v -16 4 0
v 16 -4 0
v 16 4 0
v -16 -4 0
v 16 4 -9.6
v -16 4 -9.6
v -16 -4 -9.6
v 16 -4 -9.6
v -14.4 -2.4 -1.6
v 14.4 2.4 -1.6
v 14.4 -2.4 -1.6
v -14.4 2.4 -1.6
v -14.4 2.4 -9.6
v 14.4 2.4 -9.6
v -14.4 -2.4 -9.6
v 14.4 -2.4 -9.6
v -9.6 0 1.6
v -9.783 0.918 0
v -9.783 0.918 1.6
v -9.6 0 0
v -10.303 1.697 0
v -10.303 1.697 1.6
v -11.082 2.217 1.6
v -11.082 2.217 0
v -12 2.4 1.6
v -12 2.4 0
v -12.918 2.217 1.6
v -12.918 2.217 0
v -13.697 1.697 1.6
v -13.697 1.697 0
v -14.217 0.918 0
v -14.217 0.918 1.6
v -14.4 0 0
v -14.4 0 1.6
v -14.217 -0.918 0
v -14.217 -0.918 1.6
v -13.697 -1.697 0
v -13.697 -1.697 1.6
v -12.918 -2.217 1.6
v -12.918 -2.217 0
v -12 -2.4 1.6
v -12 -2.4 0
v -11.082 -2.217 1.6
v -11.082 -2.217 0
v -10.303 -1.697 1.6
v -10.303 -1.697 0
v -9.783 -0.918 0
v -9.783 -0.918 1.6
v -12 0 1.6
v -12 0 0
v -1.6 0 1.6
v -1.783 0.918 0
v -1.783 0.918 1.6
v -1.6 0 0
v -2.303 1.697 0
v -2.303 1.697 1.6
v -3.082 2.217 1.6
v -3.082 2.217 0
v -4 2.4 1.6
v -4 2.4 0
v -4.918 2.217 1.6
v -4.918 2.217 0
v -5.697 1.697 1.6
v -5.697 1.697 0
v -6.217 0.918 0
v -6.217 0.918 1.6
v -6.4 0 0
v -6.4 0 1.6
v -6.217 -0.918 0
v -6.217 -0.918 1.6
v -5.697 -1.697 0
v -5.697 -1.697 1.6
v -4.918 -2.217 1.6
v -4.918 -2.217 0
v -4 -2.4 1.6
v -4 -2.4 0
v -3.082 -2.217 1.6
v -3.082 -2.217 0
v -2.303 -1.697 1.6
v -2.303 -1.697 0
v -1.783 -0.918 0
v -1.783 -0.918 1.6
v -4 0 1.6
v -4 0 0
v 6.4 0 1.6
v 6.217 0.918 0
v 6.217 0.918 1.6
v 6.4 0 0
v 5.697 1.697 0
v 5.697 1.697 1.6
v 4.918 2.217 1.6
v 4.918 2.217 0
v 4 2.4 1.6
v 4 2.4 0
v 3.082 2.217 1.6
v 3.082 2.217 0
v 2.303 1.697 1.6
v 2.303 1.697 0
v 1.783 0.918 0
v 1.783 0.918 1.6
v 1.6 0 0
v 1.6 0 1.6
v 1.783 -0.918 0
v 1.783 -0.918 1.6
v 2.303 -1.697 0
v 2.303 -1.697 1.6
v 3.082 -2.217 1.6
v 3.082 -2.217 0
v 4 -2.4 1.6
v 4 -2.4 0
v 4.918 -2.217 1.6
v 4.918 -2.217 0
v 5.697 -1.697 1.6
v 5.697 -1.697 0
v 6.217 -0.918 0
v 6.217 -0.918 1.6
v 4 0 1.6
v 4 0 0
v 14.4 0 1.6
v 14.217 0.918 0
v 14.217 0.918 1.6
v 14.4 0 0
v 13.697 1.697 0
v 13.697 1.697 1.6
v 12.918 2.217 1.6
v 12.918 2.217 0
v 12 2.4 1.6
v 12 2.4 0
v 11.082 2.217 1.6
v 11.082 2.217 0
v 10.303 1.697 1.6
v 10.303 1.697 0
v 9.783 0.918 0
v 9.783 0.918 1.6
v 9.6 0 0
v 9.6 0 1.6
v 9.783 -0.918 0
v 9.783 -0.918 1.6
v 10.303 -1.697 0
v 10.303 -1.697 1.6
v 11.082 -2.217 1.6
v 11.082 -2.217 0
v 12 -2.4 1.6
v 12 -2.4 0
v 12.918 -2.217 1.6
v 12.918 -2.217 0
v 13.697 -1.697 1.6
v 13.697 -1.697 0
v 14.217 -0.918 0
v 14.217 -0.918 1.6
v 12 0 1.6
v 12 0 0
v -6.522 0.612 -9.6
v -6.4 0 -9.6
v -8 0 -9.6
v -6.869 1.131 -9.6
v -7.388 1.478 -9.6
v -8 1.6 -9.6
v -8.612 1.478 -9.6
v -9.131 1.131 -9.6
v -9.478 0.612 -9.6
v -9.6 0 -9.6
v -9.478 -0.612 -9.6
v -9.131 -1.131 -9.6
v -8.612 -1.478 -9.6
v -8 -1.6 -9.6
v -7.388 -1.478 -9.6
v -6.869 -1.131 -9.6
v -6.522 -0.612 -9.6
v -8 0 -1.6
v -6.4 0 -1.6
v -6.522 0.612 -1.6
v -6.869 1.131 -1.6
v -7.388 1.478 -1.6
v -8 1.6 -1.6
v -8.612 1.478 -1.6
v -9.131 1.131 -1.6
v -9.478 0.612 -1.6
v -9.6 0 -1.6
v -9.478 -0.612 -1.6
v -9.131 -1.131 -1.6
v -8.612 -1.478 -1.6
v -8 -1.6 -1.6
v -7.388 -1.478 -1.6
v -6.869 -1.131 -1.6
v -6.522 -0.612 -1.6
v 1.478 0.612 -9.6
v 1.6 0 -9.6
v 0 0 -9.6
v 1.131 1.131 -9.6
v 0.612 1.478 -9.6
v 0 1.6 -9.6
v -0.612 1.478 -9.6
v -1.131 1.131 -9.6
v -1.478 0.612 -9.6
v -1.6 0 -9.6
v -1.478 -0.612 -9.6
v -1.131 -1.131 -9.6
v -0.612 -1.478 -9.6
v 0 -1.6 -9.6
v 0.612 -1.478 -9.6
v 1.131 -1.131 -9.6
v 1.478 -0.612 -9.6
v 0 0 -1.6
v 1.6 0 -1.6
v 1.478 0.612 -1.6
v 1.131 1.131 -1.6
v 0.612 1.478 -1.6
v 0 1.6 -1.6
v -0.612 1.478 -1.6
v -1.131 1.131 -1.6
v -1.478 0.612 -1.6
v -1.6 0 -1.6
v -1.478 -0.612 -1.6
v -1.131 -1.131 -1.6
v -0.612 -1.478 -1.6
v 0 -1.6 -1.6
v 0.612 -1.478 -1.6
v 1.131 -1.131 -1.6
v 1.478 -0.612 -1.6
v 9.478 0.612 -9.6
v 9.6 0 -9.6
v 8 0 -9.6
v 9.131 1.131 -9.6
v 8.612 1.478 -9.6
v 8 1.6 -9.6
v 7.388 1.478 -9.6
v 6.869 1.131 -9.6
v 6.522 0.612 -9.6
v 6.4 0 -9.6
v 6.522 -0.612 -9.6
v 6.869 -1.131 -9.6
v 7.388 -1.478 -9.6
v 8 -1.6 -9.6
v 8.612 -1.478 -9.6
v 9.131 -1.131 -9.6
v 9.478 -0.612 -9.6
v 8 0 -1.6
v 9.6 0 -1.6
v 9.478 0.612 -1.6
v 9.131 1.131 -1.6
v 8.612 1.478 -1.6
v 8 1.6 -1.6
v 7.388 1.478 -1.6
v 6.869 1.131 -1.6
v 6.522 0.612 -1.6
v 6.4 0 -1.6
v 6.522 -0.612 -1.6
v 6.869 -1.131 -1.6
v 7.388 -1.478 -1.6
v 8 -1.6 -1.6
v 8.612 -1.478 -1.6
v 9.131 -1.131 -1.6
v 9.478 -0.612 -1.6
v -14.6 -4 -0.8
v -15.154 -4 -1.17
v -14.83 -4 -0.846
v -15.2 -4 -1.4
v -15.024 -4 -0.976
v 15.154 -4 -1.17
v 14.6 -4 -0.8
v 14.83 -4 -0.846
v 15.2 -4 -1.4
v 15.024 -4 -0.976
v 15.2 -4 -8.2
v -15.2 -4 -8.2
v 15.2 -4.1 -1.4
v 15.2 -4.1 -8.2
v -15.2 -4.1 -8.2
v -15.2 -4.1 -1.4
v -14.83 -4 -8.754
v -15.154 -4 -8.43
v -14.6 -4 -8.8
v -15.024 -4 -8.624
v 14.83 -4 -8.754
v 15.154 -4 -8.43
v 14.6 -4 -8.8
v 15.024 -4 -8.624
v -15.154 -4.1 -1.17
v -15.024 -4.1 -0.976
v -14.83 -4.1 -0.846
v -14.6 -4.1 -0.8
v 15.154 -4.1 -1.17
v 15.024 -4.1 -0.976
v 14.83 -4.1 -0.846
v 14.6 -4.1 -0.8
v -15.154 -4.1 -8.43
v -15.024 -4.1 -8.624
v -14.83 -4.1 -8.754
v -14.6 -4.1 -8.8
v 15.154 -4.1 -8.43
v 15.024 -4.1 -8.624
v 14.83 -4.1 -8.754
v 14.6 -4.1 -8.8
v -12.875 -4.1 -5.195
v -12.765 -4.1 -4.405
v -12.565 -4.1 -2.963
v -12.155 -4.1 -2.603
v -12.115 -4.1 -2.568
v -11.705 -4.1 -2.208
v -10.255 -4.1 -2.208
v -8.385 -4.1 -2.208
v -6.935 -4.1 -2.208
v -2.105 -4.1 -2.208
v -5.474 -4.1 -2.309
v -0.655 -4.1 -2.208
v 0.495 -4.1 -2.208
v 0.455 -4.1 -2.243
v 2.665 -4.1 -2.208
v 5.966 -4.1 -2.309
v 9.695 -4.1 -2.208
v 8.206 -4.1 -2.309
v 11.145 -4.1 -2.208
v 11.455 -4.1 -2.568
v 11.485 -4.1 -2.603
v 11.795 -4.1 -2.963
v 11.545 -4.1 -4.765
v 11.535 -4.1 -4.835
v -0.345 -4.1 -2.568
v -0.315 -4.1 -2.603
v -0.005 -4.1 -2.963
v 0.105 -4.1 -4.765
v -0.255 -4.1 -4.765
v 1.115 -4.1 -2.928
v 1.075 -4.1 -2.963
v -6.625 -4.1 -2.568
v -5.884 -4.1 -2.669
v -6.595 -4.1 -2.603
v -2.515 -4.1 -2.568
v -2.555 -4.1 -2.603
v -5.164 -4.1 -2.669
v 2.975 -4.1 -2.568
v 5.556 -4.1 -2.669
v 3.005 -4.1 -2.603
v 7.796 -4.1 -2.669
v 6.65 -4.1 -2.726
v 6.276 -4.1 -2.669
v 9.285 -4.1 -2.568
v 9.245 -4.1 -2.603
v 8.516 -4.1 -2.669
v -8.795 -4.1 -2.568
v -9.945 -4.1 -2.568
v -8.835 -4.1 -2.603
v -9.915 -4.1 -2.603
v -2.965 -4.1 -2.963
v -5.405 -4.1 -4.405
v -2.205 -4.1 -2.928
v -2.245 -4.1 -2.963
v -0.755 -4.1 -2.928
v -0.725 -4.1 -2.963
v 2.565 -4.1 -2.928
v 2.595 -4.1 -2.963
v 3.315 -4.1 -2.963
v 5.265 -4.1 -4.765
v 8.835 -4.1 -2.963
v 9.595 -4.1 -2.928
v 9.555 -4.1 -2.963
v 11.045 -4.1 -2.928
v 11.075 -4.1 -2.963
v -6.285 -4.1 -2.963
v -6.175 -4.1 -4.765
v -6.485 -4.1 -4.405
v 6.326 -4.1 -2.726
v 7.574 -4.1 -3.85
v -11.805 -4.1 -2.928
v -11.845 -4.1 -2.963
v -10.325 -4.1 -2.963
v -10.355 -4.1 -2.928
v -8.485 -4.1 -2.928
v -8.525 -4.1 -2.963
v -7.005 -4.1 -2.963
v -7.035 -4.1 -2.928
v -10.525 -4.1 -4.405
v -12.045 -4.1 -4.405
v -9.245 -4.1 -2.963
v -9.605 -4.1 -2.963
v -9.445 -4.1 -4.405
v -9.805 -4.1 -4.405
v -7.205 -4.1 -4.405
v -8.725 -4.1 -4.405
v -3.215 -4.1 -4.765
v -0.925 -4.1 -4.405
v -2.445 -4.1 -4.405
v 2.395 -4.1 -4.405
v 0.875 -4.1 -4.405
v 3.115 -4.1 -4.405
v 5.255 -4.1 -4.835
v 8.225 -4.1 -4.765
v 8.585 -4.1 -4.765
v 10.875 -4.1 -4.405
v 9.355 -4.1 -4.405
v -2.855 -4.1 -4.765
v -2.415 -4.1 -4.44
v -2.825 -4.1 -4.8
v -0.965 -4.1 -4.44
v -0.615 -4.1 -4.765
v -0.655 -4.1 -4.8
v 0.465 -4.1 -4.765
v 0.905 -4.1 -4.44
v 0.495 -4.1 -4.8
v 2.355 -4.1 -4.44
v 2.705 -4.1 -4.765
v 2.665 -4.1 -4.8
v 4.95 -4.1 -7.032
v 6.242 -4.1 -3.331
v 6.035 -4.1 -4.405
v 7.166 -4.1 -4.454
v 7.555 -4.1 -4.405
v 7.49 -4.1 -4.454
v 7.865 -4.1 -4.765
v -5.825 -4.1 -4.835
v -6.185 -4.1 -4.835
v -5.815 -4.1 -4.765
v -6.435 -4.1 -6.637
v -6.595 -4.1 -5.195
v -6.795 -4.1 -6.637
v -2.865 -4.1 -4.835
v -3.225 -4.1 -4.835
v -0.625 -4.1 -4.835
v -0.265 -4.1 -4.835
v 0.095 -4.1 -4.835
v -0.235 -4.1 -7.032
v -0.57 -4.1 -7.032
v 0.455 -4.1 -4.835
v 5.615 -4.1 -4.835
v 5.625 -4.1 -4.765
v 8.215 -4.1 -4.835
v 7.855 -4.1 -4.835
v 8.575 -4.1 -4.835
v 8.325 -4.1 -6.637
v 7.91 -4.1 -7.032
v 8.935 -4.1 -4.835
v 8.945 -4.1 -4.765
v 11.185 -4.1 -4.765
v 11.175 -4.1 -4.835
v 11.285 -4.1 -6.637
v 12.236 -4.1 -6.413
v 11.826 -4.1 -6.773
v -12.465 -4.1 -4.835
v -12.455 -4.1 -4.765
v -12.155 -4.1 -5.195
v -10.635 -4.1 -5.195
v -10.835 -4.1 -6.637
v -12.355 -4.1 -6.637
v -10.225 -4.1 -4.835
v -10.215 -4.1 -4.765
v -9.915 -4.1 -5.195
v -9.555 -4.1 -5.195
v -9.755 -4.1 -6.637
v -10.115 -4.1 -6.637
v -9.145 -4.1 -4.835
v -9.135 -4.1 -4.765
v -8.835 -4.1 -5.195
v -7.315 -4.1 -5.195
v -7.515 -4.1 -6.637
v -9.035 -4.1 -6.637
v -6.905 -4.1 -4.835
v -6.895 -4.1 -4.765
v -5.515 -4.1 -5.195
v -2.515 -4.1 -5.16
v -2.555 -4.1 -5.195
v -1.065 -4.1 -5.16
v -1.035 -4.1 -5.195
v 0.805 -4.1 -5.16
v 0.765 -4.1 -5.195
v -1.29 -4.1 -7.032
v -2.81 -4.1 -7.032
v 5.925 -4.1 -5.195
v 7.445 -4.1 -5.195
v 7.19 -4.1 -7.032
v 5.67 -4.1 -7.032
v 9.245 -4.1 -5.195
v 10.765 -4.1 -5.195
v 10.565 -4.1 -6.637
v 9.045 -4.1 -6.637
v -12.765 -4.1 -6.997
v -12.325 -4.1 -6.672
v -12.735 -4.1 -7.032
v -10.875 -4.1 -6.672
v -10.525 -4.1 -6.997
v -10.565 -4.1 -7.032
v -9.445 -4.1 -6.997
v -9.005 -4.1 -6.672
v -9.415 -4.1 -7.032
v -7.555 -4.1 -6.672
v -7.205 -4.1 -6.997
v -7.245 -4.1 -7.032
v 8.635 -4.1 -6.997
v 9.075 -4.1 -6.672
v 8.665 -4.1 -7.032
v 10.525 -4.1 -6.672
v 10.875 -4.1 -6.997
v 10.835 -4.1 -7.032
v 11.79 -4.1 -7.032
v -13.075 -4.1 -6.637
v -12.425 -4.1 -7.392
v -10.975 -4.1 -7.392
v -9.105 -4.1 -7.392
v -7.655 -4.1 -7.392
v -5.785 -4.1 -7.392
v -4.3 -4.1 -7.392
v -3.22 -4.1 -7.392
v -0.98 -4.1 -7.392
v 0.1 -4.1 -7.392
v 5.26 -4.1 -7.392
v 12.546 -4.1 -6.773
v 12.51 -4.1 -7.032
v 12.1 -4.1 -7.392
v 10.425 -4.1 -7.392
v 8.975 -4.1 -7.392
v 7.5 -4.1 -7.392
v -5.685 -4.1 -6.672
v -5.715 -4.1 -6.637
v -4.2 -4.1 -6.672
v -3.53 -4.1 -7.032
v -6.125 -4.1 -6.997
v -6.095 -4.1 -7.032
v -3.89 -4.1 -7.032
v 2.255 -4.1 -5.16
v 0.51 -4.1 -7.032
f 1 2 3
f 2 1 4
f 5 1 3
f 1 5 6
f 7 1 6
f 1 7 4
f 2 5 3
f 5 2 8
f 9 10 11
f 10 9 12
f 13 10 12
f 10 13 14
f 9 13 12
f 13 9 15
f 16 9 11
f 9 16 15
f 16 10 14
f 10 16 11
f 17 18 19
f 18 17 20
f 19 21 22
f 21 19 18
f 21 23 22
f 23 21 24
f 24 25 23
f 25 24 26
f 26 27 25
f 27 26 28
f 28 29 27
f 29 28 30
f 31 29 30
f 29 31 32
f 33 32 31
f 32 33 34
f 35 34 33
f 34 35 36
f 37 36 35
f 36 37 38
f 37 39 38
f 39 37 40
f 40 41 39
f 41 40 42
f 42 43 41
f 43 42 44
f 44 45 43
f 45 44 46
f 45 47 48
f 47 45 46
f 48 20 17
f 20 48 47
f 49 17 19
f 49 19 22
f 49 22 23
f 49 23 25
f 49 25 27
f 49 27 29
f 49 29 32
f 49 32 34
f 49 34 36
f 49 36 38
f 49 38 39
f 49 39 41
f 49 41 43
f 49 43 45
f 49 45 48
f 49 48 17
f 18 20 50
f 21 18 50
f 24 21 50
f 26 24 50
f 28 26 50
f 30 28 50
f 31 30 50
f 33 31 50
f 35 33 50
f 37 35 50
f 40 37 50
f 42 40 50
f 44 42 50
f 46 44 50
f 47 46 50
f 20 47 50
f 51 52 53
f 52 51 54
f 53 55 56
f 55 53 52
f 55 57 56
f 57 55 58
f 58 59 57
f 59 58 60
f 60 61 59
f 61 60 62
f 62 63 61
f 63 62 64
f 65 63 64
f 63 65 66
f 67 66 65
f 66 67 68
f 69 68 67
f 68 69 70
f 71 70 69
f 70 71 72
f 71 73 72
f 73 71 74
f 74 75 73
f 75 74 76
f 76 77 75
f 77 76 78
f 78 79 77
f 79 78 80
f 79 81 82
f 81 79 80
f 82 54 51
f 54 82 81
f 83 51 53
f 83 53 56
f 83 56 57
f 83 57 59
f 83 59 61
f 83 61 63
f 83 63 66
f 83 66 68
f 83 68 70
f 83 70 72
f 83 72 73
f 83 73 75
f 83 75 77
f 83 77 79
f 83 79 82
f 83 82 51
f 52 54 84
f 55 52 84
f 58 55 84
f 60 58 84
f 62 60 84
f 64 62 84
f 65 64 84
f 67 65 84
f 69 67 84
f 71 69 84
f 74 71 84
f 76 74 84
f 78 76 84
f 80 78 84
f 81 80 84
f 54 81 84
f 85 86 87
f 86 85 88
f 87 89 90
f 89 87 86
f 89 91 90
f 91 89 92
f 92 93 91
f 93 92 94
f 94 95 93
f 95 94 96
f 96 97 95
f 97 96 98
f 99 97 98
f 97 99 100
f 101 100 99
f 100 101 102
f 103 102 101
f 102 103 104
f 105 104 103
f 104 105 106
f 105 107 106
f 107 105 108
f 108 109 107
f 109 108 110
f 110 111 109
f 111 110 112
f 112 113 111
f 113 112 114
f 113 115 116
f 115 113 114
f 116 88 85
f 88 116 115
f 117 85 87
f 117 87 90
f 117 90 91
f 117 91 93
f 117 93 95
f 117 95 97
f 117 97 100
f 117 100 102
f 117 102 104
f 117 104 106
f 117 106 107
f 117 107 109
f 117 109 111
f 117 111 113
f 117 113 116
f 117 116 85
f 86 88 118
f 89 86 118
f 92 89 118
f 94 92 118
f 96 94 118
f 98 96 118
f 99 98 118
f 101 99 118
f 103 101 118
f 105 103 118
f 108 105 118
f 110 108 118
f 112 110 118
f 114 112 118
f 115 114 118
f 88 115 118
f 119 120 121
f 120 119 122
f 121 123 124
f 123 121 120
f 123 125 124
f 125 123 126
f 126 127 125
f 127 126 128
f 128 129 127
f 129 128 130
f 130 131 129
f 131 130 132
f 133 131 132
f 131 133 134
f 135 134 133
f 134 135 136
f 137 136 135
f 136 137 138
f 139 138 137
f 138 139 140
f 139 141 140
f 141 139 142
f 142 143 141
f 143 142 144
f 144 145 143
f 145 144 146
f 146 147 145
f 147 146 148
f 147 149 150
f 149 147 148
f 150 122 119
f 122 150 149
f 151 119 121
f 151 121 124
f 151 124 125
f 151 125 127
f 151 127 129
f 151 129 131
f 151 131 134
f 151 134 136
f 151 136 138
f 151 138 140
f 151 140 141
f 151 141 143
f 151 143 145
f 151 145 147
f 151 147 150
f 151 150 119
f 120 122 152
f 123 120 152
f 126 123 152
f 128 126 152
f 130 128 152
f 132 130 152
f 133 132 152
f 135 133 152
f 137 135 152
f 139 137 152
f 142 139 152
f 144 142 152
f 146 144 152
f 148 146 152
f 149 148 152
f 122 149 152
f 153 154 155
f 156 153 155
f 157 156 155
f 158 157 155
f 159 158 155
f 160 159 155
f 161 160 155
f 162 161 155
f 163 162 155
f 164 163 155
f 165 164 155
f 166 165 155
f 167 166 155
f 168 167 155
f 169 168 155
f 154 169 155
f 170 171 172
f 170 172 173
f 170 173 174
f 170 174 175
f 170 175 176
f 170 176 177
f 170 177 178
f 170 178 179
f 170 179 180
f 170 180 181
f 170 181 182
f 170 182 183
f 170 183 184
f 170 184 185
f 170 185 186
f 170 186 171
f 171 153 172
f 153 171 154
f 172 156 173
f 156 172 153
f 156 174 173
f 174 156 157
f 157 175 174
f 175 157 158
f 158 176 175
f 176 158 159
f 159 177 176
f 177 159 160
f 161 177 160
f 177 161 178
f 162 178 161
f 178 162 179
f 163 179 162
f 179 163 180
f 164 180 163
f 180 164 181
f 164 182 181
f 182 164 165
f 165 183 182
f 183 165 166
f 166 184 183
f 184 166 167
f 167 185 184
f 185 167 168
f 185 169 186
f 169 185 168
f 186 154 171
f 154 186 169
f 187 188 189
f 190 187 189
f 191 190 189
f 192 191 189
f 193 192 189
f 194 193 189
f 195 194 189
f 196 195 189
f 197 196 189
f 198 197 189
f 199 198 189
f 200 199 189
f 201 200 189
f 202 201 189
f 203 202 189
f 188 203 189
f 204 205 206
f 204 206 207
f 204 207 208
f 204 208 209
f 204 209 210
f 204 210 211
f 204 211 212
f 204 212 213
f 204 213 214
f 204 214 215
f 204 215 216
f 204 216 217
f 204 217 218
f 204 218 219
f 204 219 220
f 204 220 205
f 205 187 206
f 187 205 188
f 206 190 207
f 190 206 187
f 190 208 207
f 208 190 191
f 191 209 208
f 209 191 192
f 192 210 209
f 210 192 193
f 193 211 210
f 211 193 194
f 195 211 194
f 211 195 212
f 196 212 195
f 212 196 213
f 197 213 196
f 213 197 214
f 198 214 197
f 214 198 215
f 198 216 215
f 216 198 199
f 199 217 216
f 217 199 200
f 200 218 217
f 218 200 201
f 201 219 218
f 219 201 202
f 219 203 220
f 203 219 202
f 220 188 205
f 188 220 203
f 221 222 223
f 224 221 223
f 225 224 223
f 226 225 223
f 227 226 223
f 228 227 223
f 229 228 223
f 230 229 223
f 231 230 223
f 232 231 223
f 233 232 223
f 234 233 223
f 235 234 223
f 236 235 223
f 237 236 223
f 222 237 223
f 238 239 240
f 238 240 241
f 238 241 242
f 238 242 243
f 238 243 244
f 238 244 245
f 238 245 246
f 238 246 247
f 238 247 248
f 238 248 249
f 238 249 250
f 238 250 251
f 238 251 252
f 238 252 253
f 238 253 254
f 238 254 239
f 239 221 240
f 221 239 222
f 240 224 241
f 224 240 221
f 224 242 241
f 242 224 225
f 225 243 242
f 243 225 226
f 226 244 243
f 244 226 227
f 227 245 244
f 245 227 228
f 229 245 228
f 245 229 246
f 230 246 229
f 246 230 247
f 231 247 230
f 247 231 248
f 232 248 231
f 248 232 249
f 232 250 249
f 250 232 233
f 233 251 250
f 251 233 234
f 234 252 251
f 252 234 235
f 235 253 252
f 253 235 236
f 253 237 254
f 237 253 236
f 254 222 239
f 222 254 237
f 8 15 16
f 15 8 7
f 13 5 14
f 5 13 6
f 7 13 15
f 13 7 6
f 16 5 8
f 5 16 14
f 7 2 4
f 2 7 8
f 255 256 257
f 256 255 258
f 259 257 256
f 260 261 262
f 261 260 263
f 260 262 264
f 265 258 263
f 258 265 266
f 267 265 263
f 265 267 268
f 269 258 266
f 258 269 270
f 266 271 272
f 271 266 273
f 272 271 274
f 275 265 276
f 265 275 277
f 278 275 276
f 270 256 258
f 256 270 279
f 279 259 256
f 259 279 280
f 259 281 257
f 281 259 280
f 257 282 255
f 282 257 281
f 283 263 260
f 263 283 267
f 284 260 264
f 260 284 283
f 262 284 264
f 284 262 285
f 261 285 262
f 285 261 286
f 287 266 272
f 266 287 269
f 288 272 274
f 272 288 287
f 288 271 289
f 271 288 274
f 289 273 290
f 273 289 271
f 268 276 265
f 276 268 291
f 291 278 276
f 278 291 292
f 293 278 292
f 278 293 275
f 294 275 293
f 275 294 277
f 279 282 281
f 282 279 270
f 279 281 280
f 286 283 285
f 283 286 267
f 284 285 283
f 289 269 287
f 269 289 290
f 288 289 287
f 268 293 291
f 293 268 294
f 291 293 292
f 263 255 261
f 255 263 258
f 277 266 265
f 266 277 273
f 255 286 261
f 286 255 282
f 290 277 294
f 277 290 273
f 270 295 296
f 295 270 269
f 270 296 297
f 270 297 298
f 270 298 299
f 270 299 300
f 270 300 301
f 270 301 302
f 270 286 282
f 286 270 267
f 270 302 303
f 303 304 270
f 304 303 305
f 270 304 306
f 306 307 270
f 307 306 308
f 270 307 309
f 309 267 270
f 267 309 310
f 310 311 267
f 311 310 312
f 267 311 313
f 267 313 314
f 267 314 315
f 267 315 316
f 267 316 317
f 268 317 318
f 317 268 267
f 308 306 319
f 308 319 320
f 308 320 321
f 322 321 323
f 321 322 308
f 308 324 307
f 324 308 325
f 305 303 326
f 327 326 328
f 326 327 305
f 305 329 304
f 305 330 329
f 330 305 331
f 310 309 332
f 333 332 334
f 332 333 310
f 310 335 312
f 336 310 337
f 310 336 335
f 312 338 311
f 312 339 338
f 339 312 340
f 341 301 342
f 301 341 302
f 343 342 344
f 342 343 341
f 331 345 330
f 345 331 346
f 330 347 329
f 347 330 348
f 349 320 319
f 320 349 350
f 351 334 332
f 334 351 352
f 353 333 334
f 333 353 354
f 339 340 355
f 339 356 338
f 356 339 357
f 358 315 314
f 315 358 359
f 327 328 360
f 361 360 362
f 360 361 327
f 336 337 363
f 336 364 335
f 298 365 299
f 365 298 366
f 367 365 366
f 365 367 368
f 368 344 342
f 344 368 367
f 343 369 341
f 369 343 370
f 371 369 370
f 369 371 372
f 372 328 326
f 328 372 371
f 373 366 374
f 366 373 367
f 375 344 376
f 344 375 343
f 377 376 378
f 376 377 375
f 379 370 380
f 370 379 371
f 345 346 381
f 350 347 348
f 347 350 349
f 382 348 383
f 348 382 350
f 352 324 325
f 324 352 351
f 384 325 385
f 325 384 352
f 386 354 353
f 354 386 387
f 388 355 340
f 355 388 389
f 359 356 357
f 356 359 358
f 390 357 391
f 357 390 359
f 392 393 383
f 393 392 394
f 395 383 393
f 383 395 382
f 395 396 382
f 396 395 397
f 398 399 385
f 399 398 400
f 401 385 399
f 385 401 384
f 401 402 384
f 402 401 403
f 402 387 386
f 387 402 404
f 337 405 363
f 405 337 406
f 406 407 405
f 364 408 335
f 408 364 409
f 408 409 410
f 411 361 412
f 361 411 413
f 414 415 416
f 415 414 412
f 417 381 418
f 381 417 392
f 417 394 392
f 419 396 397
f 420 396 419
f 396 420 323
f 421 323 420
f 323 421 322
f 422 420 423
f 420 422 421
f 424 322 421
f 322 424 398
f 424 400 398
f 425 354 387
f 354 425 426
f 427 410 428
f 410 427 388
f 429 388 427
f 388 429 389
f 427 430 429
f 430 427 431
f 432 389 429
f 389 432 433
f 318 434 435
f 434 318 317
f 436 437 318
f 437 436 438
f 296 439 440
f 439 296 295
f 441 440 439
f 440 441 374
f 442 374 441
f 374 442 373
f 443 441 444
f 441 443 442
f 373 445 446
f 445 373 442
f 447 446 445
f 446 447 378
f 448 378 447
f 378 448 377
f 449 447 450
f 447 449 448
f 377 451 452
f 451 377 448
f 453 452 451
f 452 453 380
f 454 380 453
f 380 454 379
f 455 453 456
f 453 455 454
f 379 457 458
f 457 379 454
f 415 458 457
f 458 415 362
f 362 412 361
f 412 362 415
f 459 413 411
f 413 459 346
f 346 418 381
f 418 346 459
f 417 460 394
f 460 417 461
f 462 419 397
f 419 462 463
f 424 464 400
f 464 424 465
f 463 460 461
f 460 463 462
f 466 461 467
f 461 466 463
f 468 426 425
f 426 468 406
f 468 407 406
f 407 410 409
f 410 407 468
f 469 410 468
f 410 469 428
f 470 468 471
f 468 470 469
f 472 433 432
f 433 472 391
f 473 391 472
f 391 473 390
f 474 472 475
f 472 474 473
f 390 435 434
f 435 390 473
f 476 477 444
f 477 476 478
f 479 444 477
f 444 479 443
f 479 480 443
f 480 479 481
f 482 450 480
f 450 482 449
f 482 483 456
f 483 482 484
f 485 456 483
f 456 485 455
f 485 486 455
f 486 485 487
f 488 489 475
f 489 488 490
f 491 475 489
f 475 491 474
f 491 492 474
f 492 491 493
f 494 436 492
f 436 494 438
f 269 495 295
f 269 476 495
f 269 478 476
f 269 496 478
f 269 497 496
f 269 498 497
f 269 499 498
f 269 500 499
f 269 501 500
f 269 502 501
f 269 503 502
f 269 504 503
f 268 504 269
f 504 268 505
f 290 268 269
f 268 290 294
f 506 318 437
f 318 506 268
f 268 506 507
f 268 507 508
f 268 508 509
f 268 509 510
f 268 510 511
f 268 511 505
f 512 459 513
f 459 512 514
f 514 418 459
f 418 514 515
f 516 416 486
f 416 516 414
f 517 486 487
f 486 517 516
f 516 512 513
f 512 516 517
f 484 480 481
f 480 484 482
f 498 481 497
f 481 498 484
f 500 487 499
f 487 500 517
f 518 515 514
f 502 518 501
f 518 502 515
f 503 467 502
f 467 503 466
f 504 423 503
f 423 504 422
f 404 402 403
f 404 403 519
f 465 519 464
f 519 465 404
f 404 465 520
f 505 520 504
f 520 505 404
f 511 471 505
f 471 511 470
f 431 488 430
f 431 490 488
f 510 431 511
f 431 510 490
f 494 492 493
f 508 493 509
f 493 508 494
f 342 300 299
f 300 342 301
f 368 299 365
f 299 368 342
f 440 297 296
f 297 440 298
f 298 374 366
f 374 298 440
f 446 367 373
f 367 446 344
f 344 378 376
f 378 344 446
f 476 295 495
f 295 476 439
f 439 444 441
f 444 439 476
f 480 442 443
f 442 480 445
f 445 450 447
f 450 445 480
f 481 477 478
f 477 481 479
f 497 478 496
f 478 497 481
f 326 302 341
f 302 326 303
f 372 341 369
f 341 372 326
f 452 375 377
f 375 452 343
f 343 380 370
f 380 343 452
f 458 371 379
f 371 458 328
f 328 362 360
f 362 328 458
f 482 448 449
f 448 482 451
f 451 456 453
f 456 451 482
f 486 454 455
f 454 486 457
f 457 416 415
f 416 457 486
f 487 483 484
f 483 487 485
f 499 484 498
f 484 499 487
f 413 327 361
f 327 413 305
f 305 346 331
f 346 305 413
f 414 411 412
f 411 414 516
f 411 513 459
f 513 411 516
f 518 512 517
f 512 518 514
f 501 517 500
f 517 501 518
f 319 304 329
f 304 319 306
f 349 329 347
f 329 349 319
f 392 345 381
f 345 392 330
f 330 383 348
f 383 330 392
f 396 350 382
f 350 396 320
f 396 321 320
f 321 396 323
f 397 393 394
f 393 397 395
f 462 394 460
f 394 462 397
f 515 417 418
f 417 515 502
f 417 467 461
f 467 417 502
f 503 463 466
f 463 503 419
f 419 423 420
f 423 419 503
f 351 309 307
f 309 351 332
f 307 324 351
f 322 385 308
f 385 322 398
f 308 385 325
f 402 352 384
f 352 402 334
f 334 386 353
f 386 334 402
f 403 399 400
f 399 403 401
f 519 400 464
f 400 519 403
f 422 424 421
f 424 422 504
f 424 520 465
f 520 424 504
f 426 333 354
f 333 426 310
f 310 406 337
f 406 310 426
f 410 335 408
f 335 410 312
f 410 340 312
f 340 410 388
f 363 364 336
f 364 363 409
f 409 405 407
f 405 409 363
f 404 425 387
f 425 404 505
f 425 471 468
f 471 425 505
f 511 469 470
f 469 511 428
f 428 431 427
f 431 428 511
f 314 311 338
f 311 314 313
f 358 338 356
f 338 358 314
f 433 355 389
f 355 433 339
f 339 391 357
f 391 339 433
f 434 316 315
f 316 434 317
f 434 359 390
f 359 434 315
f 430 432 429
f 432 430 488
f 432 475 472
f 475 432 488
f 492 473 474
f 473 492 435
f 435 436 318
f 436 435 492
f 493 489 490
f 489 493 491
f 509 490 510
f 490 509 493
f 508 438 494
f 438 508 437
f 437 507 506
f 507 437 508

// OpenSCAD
use <../lib.scad>
use <3010.scad>
use <6221655ao.scad>
function ldraw_lib__3010d0t() = [
// 0 Brick  1 x  4 with Yellow "Lap  No." on Black Background Sticker
// 0 Name: 3010d0t.dat
// 0 Author: Alfred Schmitz [AlfredS]
// 0 !LDRAW_ORG Shortcut UPDATE 2026-09
// 0 !LICENSE Licensed under CC BY 4.0 : see CAreadme.txt
// 
// 0 BFC CERTIFY CCW
  [0,"BFC","CERTIFY"],
  [0,"BFC","CCW"],
// 
// 0 !CATEGORY Sticker Shortcut
// 0 !KEYWORDS 911 RSR, Porsche, Set 75888, Speed Champions, Turbo
// 
// 0 !HISTORY 2026-09-30 [OrionP] Official Update 2026-09
// 
// 1 16 0 0 0 1 0 0 0 1 0 0 0 1 3010.dat
  [1,16,0,0,0,1,0,0,0,1,0,0,0,1, ldraw_lib__3010()],
// 1 16 0 12 -10 1 0 0 0 0 -1 0 1 0 6221655ao.dat
  [1,16,0,12,-10,1,0,0,0,0,-1,0,1,0, ldraw_lib__6221655ao()],
];
module ldraw_lib__3010d0t(step=0, col=false, unit=2/5, alt=false, line=0.2, solid=!$preview)
    makepoly(ldraw_lib__3010d0t(), step=step, col=col, unit=unit, alt=alt, line=line, solid=solid);
ldraw_lib__3010d0t(line=0.2);
